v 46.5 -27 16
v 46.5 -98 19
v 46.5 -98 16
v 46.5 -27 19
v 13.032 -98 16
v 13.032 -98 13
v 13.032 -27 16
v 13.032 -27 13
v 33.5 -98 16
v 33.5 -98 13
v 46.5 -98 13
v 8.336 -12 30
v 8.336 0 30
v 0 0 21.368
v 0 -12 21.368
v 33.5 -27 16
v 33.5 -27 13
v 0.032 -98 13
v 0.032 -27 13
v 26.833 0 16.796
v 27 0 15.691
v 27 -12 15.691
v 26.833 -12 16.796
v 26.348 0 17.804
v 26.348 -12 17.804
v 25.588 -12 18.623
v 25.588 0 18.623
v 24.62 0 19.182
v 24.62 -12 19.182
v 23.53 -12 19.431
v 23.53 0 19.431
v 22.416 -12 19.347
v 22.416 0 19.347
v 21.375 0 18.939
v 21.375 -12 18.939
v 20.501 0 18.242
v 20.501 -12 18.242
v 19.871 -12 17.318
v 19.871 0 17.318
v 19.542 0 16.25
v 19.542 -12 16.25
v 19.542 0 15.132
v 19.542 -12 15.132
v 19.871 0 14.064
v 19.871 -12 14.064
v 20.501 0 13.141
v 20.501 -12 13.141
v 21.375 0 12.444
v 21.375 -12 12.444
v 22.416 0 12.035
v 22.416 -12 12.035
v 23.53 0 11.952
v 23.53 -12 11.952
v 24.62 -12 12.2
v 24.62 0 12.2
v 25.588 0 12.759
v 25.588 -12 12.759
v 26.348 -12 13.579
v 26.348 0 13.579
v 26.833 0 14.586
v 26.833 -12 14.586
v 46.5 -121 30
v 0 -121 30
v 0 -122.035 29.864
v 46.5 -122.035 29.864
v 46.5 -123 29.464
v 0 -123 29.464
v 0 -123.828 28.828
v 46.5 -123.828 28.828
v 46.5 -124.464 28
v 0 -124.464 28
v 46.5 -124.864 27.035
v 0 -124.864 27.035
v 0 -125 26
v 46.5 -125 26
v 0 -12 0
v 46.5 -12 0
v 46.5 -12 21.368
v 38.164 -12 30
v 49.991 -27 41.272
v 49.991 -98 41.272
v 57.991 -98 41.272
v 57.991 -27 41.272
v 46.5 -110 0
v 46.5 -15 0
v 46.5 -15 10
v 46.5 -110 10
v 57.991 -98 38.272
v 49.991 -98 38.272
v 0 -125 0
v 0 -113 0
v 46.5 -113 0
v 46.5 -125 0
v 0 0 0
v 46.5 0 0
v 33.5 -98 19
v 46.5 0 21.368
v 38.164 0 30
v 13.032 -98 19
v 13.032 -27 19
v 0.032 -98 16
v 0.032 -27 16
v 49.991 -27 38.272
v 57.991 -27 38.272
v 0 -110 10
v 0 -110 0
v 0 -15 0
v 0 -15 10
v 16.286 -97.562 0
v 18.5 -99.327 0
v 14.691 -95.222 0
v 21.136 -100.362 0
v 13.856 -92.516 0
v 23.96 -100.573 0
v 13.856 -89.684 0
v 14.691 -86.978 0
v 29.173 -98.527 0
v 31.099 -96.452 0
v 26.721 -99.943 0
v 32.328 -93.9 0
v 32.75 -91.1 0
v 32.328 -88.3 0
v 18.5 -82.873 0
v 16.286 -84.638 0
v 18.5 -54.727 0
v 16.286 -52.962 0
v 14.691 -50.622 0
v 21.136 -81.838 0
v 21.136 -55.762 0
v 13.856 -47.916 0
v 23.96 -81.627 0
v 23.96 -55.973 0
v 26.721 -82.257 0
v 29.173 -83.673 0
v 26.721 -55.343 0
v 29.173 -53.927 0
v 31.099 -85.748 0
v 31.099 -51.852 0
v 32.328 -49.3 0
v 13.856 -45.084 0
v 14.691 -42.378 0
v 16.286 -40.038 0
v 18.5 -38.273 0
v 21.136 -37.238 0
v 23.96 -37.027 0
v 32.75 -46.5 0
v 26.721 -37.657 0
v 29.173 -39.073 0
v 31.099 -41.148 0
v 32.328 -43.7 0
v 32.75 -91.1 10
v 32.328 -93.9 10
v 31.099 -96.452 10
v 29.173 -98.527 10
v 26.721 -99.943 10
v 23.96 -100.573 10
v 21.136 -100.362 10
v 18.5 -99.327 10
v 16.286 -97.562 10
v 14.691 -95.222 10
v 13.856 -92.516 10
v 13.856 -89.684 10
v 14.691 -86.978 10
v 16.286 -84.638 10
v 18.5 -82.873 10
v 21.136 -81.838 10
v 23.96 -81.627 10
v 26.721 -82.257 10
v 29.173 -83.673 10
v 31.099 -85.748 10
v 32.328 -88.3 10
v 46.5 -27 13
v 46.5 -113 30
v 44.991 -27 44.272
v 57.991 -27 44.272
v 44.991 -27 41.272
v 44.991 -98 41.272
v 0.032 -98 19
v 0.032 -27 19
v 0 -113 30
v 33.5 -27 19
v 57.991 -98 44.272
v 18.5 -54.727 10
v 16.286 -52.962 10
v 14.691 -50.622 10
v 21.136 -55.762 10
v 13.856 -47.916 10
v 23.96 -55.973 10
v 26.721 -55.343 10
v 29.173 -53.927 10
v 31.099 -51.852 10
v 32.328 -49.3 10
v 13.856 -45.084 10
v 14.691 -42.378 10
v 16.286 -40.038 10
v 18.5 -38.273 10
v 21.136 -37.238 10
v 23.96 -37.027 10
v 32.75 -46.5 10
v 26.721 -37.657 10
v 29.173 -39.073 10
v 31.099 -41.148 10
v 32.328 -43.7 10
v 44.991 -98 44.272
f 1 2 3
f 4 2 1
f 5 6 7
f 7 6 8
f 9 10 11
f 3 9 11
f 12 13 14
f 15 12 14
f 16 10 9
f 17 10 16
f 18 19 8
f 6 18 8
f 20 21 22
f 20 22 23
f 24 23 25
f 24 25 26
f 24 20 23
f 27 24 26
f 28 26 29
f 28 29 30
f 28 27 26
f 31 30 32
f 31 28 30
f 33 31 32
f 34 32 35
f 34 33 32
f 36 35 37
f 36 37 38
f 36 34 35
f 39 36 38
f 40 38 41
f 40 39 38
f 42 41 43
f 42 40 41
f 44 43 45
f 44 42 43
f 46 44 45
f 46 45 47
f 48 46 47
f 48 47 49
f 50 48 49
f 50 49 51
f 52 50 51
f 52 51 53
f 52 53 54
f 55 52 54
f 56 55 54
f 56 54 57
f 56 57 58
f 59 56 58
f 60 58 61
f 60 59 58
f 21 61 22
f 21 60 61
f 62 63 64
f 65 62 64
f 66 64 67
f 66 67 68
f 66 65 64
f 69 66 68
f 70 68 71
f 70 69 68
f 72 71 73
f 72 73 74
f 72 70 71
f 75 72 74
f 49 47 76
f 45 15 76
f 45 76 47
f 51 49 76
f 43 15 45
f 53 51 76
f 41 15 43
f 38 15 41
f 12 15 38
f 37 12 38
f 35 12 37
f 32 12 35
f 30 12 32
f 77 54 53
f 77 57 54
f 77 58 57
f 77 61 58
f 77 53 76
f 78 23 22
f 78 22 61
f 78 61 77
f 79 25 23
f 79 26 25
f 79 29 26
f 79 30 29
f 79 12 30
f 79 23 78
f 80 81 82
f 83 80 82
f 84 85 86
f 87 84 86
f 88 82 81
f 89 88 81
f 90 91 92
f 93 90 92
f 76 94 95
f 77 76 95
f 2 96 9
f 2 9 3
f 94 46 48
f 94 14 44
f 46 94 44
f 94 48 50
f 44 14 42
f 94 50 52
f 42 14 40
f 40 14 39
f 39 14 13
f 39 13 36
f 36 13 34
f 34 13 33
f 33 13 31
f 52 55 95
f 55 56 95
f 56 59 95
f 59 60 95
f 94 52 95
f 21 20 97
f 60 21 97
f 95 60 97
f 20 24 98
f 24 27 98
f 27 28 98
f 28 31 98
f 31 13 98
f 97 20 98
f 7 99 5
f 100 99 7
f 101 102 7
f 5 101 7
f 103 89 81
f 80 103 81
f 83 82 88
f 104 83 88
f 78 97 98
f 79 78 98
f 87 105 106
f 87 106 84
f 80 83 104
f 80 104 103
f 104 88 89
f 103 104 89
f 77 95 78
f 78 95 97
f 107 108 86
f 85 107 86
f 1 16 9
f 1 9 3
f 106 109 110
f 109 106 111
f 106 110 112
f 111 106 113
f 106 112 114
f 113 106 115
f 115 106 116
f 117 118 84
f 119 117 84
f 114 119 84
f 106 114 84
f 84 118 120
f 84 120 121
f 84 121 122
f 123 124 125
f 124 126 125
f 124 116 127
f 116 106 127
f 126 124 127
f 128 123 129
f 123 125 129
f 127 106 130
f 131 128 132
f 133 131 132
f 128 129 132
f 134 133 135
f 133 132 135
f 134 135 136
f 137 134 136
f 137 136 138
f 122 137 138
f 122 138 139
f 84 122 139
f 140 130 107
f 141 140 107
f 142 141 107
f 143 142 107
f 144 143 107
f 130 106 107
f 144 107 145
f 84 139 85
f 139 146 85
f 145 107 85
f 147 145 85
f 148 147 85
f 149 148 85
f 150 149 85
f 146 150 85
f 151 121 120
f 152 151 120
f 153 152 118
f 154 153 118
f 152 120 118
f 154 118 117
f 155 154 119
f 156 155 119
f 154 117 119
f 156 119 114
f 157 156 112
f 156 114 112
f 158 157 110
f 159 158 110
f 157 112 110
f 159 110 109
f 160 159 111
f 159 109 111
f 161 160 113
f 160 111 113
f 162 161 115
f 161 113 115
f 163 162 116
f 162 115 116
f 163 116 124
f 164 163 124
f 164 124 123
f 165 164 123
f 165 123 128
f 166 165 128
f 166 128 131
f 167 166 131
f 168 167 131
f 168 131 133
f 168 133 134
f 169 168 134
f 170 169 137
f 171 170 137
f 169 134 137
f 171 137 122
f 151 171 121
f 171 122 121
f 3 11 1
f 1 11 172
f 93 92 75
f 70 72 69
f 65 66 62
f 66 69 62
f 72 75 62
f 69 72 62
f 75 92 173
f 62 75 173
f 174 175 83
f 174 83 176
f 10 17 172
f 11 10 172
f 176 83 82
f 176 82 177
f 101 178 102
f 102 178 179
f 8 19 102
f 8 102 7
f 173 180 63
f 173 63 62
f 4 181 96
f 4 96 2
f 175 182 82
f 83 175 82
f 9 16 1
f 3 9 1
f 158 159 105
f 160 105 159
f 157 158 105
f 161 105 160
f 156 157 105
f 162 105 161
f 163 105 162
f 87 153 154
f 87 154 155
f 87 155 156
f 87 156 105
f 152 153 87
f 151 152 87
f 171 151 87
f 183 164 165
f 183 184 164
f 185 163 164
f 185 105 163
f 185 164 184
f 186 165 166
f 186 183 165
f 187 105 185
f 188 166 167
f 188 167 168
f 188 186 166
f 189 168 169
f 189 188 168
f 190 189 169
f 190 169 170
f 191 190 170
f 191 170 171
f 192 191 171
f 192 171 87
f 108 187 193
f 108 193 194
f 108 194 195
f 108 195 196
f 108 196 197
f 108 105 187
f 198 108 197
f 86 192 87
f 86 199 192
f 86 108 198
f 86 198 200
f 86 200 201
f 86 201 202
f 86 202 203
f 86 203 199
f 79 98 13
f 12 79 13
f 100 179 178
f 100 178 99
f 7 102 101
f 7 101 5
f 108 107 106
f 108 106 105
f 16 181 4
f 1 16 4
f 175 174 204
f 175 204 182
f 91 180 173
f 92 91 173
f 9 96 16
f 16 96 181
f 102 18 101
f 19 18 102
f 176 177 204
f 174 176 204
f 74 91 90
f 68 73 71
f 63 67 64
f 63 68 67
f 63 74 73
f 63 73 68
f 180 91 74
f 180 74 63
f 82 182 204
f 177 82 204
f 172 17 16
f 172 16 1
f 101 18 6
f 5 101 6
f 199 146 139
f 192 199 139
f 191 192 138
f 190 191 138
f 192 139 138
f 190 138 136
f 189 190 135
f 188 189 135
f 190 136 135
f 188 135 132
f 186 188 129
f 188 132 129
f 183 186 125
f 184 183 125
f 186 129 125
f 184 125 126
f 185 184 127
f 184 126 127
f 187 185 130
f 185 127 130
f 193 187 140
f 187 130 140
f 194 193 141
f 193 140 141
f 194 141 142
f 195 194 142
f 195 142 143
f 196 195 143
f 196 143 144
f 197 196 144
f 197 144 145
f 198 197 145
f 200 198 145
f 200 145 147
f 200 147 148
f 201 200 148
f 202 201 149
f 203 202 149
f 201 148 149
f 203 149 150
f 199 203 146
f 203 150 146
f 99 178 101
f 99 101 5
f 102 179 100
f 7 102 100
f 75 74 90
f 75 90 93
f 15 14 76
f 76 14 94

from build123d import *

# Parameters (mm, degrees)
F0_R      = 3.75
F1_DEPTH  = 12
F3_W      = 46.5
F3_H      = 10
F4_DEPTH  = 95
F6_W      = 46.5
F6_H      = 30
F7_DEPTH  = 12
F8_R      = 4
F10_W     = 13
F10_H     = 71
F11_DEPTH = 3
F14_R     = 9.5
F15_DEPTH = 10
F18_DEPTH = 71
F19_DEPTH = 71


with BuildPart() as f1:
    # F0 (on Front) → F1 (new body)
    with BuildSketch(Plane.XZ):
        Polygon((0, 21.3680540694), (0, 0), (46.5, 0), (46.5, 21.3680540694), (38.1639632048, 30), (23.25, 30), (8.3360367952, 30), align=None)
        with Locations((23.25, 15.6911602244)):
            Circle(F0_R, mode=Mode.SUBTRACT)
    extrude(amount=F1_DEPTH)


with BuildPart() as f4:
    # F3 (on offset) → F4 (new body)
    with BuildSketch(Plane.XZ.offset(15)):
        with Locations((23.25, 5)):
            Rectangle(F3_W, F3_H)
    extrude(amount=F4_DEPTH)

    # F14 (on face) → F15 (cut, through all)
    with BuildSketch(Plane(origin=(0, 0, 0), x_dir=(1, 0, 0), z_dir=(0, 0, -1))):
        with Locations((23.25, 91.1)):
            Circle(F14_R)
        with Locations((23.25, 46.5)):
            Circle(F14_R)
    extrude(amount=-F15_DEPTH, mode=Mode.SUBTRACT)


with BuildPart() as f7:
    # F6 (on offset) → F7 (new body)
    with BuildSketch(Plane.XZ.offset(113)):
        with Locations((23.25, 15)):
            Rectangle(F6_W, F6_H)
    extrude(amount=F7_DEPTH)

    # F8
    f8_edges = [f7.edges().sort_by_distance(p)[0] for p in [
        (23.25, -125, 30),
    ]]
    fillet(f8_edges, radius=F8_R)


with BuildPart() as f11:
    # F10 (on offset) → F11 (new body)
    with BuildSketch(Plane.XY.offset(13)):
        with Locations((40, -62.5)):
            Rectangle(F10_W, F10_H)
    extrude(amount=F11_DEPTH)


with BuildPart() as f11b:
    # F10 (on offset) → F11, piece 2 (new body)
    with BuildSketch(Plane.XY.offset(13)):
        with Locations((6.5324707329, -62.5)):
            Rectangle(F10_W, F10_H)
    extrude(amount=F11_DEPTH)


with BuildPart() as f13_1:
    # F13: instance of F11
    add(f11.part.mirror(Plane.XY.offset(16)))


with BuildPart() as f13_2:
    # F13: instance of F11b
    add(f11b.part.mirror(Plane.XY.offset(16)))


with BuildPart() as f18:
    # F17 (on offset) → F18 (new body)
    with BuildSketch(Plane(origin=(0, -27, 0), x_dir=(-1, 0, 0), z_dir=(0, 1, 0))):
        Polygon((-53.3646971181, 41.2717601284), (-57.9912078685, 41.2717601284), (-57.9912078685, 38.2717601284), (-53.3646971181, 38.2717601284), (-49.9912078685, 38.2717601284), (-49.9912078685, 41.2717601284), align=None)
    extrude(amount=-F18_DEPTH)


with BuildPart() as f19:
    # F17 (on offset) → F19 (new body)
    with BuildSketch(Plane(origin=(0, -27, 0), x_dir=(-1, 0, 0), z_dir=(0, 1, 0))):
        Polygon((-44.9912078685, 41.2717601284), (-44.9912078685, 44.2717601284), (-57.9912078685, 44.2717601284), (-57.9912078685, 41.2717601284), (-53.3646971181, 41.2717601284), (-49.9912078685, 41.2717601284), align=None)
    extrude(amount=-F19_DEPTH)


solid = Compound([f1.part, f4.part, f7.part, f11.part, f11b.part, f13_1.part, f13_2.part, f18.part, f19.part])
